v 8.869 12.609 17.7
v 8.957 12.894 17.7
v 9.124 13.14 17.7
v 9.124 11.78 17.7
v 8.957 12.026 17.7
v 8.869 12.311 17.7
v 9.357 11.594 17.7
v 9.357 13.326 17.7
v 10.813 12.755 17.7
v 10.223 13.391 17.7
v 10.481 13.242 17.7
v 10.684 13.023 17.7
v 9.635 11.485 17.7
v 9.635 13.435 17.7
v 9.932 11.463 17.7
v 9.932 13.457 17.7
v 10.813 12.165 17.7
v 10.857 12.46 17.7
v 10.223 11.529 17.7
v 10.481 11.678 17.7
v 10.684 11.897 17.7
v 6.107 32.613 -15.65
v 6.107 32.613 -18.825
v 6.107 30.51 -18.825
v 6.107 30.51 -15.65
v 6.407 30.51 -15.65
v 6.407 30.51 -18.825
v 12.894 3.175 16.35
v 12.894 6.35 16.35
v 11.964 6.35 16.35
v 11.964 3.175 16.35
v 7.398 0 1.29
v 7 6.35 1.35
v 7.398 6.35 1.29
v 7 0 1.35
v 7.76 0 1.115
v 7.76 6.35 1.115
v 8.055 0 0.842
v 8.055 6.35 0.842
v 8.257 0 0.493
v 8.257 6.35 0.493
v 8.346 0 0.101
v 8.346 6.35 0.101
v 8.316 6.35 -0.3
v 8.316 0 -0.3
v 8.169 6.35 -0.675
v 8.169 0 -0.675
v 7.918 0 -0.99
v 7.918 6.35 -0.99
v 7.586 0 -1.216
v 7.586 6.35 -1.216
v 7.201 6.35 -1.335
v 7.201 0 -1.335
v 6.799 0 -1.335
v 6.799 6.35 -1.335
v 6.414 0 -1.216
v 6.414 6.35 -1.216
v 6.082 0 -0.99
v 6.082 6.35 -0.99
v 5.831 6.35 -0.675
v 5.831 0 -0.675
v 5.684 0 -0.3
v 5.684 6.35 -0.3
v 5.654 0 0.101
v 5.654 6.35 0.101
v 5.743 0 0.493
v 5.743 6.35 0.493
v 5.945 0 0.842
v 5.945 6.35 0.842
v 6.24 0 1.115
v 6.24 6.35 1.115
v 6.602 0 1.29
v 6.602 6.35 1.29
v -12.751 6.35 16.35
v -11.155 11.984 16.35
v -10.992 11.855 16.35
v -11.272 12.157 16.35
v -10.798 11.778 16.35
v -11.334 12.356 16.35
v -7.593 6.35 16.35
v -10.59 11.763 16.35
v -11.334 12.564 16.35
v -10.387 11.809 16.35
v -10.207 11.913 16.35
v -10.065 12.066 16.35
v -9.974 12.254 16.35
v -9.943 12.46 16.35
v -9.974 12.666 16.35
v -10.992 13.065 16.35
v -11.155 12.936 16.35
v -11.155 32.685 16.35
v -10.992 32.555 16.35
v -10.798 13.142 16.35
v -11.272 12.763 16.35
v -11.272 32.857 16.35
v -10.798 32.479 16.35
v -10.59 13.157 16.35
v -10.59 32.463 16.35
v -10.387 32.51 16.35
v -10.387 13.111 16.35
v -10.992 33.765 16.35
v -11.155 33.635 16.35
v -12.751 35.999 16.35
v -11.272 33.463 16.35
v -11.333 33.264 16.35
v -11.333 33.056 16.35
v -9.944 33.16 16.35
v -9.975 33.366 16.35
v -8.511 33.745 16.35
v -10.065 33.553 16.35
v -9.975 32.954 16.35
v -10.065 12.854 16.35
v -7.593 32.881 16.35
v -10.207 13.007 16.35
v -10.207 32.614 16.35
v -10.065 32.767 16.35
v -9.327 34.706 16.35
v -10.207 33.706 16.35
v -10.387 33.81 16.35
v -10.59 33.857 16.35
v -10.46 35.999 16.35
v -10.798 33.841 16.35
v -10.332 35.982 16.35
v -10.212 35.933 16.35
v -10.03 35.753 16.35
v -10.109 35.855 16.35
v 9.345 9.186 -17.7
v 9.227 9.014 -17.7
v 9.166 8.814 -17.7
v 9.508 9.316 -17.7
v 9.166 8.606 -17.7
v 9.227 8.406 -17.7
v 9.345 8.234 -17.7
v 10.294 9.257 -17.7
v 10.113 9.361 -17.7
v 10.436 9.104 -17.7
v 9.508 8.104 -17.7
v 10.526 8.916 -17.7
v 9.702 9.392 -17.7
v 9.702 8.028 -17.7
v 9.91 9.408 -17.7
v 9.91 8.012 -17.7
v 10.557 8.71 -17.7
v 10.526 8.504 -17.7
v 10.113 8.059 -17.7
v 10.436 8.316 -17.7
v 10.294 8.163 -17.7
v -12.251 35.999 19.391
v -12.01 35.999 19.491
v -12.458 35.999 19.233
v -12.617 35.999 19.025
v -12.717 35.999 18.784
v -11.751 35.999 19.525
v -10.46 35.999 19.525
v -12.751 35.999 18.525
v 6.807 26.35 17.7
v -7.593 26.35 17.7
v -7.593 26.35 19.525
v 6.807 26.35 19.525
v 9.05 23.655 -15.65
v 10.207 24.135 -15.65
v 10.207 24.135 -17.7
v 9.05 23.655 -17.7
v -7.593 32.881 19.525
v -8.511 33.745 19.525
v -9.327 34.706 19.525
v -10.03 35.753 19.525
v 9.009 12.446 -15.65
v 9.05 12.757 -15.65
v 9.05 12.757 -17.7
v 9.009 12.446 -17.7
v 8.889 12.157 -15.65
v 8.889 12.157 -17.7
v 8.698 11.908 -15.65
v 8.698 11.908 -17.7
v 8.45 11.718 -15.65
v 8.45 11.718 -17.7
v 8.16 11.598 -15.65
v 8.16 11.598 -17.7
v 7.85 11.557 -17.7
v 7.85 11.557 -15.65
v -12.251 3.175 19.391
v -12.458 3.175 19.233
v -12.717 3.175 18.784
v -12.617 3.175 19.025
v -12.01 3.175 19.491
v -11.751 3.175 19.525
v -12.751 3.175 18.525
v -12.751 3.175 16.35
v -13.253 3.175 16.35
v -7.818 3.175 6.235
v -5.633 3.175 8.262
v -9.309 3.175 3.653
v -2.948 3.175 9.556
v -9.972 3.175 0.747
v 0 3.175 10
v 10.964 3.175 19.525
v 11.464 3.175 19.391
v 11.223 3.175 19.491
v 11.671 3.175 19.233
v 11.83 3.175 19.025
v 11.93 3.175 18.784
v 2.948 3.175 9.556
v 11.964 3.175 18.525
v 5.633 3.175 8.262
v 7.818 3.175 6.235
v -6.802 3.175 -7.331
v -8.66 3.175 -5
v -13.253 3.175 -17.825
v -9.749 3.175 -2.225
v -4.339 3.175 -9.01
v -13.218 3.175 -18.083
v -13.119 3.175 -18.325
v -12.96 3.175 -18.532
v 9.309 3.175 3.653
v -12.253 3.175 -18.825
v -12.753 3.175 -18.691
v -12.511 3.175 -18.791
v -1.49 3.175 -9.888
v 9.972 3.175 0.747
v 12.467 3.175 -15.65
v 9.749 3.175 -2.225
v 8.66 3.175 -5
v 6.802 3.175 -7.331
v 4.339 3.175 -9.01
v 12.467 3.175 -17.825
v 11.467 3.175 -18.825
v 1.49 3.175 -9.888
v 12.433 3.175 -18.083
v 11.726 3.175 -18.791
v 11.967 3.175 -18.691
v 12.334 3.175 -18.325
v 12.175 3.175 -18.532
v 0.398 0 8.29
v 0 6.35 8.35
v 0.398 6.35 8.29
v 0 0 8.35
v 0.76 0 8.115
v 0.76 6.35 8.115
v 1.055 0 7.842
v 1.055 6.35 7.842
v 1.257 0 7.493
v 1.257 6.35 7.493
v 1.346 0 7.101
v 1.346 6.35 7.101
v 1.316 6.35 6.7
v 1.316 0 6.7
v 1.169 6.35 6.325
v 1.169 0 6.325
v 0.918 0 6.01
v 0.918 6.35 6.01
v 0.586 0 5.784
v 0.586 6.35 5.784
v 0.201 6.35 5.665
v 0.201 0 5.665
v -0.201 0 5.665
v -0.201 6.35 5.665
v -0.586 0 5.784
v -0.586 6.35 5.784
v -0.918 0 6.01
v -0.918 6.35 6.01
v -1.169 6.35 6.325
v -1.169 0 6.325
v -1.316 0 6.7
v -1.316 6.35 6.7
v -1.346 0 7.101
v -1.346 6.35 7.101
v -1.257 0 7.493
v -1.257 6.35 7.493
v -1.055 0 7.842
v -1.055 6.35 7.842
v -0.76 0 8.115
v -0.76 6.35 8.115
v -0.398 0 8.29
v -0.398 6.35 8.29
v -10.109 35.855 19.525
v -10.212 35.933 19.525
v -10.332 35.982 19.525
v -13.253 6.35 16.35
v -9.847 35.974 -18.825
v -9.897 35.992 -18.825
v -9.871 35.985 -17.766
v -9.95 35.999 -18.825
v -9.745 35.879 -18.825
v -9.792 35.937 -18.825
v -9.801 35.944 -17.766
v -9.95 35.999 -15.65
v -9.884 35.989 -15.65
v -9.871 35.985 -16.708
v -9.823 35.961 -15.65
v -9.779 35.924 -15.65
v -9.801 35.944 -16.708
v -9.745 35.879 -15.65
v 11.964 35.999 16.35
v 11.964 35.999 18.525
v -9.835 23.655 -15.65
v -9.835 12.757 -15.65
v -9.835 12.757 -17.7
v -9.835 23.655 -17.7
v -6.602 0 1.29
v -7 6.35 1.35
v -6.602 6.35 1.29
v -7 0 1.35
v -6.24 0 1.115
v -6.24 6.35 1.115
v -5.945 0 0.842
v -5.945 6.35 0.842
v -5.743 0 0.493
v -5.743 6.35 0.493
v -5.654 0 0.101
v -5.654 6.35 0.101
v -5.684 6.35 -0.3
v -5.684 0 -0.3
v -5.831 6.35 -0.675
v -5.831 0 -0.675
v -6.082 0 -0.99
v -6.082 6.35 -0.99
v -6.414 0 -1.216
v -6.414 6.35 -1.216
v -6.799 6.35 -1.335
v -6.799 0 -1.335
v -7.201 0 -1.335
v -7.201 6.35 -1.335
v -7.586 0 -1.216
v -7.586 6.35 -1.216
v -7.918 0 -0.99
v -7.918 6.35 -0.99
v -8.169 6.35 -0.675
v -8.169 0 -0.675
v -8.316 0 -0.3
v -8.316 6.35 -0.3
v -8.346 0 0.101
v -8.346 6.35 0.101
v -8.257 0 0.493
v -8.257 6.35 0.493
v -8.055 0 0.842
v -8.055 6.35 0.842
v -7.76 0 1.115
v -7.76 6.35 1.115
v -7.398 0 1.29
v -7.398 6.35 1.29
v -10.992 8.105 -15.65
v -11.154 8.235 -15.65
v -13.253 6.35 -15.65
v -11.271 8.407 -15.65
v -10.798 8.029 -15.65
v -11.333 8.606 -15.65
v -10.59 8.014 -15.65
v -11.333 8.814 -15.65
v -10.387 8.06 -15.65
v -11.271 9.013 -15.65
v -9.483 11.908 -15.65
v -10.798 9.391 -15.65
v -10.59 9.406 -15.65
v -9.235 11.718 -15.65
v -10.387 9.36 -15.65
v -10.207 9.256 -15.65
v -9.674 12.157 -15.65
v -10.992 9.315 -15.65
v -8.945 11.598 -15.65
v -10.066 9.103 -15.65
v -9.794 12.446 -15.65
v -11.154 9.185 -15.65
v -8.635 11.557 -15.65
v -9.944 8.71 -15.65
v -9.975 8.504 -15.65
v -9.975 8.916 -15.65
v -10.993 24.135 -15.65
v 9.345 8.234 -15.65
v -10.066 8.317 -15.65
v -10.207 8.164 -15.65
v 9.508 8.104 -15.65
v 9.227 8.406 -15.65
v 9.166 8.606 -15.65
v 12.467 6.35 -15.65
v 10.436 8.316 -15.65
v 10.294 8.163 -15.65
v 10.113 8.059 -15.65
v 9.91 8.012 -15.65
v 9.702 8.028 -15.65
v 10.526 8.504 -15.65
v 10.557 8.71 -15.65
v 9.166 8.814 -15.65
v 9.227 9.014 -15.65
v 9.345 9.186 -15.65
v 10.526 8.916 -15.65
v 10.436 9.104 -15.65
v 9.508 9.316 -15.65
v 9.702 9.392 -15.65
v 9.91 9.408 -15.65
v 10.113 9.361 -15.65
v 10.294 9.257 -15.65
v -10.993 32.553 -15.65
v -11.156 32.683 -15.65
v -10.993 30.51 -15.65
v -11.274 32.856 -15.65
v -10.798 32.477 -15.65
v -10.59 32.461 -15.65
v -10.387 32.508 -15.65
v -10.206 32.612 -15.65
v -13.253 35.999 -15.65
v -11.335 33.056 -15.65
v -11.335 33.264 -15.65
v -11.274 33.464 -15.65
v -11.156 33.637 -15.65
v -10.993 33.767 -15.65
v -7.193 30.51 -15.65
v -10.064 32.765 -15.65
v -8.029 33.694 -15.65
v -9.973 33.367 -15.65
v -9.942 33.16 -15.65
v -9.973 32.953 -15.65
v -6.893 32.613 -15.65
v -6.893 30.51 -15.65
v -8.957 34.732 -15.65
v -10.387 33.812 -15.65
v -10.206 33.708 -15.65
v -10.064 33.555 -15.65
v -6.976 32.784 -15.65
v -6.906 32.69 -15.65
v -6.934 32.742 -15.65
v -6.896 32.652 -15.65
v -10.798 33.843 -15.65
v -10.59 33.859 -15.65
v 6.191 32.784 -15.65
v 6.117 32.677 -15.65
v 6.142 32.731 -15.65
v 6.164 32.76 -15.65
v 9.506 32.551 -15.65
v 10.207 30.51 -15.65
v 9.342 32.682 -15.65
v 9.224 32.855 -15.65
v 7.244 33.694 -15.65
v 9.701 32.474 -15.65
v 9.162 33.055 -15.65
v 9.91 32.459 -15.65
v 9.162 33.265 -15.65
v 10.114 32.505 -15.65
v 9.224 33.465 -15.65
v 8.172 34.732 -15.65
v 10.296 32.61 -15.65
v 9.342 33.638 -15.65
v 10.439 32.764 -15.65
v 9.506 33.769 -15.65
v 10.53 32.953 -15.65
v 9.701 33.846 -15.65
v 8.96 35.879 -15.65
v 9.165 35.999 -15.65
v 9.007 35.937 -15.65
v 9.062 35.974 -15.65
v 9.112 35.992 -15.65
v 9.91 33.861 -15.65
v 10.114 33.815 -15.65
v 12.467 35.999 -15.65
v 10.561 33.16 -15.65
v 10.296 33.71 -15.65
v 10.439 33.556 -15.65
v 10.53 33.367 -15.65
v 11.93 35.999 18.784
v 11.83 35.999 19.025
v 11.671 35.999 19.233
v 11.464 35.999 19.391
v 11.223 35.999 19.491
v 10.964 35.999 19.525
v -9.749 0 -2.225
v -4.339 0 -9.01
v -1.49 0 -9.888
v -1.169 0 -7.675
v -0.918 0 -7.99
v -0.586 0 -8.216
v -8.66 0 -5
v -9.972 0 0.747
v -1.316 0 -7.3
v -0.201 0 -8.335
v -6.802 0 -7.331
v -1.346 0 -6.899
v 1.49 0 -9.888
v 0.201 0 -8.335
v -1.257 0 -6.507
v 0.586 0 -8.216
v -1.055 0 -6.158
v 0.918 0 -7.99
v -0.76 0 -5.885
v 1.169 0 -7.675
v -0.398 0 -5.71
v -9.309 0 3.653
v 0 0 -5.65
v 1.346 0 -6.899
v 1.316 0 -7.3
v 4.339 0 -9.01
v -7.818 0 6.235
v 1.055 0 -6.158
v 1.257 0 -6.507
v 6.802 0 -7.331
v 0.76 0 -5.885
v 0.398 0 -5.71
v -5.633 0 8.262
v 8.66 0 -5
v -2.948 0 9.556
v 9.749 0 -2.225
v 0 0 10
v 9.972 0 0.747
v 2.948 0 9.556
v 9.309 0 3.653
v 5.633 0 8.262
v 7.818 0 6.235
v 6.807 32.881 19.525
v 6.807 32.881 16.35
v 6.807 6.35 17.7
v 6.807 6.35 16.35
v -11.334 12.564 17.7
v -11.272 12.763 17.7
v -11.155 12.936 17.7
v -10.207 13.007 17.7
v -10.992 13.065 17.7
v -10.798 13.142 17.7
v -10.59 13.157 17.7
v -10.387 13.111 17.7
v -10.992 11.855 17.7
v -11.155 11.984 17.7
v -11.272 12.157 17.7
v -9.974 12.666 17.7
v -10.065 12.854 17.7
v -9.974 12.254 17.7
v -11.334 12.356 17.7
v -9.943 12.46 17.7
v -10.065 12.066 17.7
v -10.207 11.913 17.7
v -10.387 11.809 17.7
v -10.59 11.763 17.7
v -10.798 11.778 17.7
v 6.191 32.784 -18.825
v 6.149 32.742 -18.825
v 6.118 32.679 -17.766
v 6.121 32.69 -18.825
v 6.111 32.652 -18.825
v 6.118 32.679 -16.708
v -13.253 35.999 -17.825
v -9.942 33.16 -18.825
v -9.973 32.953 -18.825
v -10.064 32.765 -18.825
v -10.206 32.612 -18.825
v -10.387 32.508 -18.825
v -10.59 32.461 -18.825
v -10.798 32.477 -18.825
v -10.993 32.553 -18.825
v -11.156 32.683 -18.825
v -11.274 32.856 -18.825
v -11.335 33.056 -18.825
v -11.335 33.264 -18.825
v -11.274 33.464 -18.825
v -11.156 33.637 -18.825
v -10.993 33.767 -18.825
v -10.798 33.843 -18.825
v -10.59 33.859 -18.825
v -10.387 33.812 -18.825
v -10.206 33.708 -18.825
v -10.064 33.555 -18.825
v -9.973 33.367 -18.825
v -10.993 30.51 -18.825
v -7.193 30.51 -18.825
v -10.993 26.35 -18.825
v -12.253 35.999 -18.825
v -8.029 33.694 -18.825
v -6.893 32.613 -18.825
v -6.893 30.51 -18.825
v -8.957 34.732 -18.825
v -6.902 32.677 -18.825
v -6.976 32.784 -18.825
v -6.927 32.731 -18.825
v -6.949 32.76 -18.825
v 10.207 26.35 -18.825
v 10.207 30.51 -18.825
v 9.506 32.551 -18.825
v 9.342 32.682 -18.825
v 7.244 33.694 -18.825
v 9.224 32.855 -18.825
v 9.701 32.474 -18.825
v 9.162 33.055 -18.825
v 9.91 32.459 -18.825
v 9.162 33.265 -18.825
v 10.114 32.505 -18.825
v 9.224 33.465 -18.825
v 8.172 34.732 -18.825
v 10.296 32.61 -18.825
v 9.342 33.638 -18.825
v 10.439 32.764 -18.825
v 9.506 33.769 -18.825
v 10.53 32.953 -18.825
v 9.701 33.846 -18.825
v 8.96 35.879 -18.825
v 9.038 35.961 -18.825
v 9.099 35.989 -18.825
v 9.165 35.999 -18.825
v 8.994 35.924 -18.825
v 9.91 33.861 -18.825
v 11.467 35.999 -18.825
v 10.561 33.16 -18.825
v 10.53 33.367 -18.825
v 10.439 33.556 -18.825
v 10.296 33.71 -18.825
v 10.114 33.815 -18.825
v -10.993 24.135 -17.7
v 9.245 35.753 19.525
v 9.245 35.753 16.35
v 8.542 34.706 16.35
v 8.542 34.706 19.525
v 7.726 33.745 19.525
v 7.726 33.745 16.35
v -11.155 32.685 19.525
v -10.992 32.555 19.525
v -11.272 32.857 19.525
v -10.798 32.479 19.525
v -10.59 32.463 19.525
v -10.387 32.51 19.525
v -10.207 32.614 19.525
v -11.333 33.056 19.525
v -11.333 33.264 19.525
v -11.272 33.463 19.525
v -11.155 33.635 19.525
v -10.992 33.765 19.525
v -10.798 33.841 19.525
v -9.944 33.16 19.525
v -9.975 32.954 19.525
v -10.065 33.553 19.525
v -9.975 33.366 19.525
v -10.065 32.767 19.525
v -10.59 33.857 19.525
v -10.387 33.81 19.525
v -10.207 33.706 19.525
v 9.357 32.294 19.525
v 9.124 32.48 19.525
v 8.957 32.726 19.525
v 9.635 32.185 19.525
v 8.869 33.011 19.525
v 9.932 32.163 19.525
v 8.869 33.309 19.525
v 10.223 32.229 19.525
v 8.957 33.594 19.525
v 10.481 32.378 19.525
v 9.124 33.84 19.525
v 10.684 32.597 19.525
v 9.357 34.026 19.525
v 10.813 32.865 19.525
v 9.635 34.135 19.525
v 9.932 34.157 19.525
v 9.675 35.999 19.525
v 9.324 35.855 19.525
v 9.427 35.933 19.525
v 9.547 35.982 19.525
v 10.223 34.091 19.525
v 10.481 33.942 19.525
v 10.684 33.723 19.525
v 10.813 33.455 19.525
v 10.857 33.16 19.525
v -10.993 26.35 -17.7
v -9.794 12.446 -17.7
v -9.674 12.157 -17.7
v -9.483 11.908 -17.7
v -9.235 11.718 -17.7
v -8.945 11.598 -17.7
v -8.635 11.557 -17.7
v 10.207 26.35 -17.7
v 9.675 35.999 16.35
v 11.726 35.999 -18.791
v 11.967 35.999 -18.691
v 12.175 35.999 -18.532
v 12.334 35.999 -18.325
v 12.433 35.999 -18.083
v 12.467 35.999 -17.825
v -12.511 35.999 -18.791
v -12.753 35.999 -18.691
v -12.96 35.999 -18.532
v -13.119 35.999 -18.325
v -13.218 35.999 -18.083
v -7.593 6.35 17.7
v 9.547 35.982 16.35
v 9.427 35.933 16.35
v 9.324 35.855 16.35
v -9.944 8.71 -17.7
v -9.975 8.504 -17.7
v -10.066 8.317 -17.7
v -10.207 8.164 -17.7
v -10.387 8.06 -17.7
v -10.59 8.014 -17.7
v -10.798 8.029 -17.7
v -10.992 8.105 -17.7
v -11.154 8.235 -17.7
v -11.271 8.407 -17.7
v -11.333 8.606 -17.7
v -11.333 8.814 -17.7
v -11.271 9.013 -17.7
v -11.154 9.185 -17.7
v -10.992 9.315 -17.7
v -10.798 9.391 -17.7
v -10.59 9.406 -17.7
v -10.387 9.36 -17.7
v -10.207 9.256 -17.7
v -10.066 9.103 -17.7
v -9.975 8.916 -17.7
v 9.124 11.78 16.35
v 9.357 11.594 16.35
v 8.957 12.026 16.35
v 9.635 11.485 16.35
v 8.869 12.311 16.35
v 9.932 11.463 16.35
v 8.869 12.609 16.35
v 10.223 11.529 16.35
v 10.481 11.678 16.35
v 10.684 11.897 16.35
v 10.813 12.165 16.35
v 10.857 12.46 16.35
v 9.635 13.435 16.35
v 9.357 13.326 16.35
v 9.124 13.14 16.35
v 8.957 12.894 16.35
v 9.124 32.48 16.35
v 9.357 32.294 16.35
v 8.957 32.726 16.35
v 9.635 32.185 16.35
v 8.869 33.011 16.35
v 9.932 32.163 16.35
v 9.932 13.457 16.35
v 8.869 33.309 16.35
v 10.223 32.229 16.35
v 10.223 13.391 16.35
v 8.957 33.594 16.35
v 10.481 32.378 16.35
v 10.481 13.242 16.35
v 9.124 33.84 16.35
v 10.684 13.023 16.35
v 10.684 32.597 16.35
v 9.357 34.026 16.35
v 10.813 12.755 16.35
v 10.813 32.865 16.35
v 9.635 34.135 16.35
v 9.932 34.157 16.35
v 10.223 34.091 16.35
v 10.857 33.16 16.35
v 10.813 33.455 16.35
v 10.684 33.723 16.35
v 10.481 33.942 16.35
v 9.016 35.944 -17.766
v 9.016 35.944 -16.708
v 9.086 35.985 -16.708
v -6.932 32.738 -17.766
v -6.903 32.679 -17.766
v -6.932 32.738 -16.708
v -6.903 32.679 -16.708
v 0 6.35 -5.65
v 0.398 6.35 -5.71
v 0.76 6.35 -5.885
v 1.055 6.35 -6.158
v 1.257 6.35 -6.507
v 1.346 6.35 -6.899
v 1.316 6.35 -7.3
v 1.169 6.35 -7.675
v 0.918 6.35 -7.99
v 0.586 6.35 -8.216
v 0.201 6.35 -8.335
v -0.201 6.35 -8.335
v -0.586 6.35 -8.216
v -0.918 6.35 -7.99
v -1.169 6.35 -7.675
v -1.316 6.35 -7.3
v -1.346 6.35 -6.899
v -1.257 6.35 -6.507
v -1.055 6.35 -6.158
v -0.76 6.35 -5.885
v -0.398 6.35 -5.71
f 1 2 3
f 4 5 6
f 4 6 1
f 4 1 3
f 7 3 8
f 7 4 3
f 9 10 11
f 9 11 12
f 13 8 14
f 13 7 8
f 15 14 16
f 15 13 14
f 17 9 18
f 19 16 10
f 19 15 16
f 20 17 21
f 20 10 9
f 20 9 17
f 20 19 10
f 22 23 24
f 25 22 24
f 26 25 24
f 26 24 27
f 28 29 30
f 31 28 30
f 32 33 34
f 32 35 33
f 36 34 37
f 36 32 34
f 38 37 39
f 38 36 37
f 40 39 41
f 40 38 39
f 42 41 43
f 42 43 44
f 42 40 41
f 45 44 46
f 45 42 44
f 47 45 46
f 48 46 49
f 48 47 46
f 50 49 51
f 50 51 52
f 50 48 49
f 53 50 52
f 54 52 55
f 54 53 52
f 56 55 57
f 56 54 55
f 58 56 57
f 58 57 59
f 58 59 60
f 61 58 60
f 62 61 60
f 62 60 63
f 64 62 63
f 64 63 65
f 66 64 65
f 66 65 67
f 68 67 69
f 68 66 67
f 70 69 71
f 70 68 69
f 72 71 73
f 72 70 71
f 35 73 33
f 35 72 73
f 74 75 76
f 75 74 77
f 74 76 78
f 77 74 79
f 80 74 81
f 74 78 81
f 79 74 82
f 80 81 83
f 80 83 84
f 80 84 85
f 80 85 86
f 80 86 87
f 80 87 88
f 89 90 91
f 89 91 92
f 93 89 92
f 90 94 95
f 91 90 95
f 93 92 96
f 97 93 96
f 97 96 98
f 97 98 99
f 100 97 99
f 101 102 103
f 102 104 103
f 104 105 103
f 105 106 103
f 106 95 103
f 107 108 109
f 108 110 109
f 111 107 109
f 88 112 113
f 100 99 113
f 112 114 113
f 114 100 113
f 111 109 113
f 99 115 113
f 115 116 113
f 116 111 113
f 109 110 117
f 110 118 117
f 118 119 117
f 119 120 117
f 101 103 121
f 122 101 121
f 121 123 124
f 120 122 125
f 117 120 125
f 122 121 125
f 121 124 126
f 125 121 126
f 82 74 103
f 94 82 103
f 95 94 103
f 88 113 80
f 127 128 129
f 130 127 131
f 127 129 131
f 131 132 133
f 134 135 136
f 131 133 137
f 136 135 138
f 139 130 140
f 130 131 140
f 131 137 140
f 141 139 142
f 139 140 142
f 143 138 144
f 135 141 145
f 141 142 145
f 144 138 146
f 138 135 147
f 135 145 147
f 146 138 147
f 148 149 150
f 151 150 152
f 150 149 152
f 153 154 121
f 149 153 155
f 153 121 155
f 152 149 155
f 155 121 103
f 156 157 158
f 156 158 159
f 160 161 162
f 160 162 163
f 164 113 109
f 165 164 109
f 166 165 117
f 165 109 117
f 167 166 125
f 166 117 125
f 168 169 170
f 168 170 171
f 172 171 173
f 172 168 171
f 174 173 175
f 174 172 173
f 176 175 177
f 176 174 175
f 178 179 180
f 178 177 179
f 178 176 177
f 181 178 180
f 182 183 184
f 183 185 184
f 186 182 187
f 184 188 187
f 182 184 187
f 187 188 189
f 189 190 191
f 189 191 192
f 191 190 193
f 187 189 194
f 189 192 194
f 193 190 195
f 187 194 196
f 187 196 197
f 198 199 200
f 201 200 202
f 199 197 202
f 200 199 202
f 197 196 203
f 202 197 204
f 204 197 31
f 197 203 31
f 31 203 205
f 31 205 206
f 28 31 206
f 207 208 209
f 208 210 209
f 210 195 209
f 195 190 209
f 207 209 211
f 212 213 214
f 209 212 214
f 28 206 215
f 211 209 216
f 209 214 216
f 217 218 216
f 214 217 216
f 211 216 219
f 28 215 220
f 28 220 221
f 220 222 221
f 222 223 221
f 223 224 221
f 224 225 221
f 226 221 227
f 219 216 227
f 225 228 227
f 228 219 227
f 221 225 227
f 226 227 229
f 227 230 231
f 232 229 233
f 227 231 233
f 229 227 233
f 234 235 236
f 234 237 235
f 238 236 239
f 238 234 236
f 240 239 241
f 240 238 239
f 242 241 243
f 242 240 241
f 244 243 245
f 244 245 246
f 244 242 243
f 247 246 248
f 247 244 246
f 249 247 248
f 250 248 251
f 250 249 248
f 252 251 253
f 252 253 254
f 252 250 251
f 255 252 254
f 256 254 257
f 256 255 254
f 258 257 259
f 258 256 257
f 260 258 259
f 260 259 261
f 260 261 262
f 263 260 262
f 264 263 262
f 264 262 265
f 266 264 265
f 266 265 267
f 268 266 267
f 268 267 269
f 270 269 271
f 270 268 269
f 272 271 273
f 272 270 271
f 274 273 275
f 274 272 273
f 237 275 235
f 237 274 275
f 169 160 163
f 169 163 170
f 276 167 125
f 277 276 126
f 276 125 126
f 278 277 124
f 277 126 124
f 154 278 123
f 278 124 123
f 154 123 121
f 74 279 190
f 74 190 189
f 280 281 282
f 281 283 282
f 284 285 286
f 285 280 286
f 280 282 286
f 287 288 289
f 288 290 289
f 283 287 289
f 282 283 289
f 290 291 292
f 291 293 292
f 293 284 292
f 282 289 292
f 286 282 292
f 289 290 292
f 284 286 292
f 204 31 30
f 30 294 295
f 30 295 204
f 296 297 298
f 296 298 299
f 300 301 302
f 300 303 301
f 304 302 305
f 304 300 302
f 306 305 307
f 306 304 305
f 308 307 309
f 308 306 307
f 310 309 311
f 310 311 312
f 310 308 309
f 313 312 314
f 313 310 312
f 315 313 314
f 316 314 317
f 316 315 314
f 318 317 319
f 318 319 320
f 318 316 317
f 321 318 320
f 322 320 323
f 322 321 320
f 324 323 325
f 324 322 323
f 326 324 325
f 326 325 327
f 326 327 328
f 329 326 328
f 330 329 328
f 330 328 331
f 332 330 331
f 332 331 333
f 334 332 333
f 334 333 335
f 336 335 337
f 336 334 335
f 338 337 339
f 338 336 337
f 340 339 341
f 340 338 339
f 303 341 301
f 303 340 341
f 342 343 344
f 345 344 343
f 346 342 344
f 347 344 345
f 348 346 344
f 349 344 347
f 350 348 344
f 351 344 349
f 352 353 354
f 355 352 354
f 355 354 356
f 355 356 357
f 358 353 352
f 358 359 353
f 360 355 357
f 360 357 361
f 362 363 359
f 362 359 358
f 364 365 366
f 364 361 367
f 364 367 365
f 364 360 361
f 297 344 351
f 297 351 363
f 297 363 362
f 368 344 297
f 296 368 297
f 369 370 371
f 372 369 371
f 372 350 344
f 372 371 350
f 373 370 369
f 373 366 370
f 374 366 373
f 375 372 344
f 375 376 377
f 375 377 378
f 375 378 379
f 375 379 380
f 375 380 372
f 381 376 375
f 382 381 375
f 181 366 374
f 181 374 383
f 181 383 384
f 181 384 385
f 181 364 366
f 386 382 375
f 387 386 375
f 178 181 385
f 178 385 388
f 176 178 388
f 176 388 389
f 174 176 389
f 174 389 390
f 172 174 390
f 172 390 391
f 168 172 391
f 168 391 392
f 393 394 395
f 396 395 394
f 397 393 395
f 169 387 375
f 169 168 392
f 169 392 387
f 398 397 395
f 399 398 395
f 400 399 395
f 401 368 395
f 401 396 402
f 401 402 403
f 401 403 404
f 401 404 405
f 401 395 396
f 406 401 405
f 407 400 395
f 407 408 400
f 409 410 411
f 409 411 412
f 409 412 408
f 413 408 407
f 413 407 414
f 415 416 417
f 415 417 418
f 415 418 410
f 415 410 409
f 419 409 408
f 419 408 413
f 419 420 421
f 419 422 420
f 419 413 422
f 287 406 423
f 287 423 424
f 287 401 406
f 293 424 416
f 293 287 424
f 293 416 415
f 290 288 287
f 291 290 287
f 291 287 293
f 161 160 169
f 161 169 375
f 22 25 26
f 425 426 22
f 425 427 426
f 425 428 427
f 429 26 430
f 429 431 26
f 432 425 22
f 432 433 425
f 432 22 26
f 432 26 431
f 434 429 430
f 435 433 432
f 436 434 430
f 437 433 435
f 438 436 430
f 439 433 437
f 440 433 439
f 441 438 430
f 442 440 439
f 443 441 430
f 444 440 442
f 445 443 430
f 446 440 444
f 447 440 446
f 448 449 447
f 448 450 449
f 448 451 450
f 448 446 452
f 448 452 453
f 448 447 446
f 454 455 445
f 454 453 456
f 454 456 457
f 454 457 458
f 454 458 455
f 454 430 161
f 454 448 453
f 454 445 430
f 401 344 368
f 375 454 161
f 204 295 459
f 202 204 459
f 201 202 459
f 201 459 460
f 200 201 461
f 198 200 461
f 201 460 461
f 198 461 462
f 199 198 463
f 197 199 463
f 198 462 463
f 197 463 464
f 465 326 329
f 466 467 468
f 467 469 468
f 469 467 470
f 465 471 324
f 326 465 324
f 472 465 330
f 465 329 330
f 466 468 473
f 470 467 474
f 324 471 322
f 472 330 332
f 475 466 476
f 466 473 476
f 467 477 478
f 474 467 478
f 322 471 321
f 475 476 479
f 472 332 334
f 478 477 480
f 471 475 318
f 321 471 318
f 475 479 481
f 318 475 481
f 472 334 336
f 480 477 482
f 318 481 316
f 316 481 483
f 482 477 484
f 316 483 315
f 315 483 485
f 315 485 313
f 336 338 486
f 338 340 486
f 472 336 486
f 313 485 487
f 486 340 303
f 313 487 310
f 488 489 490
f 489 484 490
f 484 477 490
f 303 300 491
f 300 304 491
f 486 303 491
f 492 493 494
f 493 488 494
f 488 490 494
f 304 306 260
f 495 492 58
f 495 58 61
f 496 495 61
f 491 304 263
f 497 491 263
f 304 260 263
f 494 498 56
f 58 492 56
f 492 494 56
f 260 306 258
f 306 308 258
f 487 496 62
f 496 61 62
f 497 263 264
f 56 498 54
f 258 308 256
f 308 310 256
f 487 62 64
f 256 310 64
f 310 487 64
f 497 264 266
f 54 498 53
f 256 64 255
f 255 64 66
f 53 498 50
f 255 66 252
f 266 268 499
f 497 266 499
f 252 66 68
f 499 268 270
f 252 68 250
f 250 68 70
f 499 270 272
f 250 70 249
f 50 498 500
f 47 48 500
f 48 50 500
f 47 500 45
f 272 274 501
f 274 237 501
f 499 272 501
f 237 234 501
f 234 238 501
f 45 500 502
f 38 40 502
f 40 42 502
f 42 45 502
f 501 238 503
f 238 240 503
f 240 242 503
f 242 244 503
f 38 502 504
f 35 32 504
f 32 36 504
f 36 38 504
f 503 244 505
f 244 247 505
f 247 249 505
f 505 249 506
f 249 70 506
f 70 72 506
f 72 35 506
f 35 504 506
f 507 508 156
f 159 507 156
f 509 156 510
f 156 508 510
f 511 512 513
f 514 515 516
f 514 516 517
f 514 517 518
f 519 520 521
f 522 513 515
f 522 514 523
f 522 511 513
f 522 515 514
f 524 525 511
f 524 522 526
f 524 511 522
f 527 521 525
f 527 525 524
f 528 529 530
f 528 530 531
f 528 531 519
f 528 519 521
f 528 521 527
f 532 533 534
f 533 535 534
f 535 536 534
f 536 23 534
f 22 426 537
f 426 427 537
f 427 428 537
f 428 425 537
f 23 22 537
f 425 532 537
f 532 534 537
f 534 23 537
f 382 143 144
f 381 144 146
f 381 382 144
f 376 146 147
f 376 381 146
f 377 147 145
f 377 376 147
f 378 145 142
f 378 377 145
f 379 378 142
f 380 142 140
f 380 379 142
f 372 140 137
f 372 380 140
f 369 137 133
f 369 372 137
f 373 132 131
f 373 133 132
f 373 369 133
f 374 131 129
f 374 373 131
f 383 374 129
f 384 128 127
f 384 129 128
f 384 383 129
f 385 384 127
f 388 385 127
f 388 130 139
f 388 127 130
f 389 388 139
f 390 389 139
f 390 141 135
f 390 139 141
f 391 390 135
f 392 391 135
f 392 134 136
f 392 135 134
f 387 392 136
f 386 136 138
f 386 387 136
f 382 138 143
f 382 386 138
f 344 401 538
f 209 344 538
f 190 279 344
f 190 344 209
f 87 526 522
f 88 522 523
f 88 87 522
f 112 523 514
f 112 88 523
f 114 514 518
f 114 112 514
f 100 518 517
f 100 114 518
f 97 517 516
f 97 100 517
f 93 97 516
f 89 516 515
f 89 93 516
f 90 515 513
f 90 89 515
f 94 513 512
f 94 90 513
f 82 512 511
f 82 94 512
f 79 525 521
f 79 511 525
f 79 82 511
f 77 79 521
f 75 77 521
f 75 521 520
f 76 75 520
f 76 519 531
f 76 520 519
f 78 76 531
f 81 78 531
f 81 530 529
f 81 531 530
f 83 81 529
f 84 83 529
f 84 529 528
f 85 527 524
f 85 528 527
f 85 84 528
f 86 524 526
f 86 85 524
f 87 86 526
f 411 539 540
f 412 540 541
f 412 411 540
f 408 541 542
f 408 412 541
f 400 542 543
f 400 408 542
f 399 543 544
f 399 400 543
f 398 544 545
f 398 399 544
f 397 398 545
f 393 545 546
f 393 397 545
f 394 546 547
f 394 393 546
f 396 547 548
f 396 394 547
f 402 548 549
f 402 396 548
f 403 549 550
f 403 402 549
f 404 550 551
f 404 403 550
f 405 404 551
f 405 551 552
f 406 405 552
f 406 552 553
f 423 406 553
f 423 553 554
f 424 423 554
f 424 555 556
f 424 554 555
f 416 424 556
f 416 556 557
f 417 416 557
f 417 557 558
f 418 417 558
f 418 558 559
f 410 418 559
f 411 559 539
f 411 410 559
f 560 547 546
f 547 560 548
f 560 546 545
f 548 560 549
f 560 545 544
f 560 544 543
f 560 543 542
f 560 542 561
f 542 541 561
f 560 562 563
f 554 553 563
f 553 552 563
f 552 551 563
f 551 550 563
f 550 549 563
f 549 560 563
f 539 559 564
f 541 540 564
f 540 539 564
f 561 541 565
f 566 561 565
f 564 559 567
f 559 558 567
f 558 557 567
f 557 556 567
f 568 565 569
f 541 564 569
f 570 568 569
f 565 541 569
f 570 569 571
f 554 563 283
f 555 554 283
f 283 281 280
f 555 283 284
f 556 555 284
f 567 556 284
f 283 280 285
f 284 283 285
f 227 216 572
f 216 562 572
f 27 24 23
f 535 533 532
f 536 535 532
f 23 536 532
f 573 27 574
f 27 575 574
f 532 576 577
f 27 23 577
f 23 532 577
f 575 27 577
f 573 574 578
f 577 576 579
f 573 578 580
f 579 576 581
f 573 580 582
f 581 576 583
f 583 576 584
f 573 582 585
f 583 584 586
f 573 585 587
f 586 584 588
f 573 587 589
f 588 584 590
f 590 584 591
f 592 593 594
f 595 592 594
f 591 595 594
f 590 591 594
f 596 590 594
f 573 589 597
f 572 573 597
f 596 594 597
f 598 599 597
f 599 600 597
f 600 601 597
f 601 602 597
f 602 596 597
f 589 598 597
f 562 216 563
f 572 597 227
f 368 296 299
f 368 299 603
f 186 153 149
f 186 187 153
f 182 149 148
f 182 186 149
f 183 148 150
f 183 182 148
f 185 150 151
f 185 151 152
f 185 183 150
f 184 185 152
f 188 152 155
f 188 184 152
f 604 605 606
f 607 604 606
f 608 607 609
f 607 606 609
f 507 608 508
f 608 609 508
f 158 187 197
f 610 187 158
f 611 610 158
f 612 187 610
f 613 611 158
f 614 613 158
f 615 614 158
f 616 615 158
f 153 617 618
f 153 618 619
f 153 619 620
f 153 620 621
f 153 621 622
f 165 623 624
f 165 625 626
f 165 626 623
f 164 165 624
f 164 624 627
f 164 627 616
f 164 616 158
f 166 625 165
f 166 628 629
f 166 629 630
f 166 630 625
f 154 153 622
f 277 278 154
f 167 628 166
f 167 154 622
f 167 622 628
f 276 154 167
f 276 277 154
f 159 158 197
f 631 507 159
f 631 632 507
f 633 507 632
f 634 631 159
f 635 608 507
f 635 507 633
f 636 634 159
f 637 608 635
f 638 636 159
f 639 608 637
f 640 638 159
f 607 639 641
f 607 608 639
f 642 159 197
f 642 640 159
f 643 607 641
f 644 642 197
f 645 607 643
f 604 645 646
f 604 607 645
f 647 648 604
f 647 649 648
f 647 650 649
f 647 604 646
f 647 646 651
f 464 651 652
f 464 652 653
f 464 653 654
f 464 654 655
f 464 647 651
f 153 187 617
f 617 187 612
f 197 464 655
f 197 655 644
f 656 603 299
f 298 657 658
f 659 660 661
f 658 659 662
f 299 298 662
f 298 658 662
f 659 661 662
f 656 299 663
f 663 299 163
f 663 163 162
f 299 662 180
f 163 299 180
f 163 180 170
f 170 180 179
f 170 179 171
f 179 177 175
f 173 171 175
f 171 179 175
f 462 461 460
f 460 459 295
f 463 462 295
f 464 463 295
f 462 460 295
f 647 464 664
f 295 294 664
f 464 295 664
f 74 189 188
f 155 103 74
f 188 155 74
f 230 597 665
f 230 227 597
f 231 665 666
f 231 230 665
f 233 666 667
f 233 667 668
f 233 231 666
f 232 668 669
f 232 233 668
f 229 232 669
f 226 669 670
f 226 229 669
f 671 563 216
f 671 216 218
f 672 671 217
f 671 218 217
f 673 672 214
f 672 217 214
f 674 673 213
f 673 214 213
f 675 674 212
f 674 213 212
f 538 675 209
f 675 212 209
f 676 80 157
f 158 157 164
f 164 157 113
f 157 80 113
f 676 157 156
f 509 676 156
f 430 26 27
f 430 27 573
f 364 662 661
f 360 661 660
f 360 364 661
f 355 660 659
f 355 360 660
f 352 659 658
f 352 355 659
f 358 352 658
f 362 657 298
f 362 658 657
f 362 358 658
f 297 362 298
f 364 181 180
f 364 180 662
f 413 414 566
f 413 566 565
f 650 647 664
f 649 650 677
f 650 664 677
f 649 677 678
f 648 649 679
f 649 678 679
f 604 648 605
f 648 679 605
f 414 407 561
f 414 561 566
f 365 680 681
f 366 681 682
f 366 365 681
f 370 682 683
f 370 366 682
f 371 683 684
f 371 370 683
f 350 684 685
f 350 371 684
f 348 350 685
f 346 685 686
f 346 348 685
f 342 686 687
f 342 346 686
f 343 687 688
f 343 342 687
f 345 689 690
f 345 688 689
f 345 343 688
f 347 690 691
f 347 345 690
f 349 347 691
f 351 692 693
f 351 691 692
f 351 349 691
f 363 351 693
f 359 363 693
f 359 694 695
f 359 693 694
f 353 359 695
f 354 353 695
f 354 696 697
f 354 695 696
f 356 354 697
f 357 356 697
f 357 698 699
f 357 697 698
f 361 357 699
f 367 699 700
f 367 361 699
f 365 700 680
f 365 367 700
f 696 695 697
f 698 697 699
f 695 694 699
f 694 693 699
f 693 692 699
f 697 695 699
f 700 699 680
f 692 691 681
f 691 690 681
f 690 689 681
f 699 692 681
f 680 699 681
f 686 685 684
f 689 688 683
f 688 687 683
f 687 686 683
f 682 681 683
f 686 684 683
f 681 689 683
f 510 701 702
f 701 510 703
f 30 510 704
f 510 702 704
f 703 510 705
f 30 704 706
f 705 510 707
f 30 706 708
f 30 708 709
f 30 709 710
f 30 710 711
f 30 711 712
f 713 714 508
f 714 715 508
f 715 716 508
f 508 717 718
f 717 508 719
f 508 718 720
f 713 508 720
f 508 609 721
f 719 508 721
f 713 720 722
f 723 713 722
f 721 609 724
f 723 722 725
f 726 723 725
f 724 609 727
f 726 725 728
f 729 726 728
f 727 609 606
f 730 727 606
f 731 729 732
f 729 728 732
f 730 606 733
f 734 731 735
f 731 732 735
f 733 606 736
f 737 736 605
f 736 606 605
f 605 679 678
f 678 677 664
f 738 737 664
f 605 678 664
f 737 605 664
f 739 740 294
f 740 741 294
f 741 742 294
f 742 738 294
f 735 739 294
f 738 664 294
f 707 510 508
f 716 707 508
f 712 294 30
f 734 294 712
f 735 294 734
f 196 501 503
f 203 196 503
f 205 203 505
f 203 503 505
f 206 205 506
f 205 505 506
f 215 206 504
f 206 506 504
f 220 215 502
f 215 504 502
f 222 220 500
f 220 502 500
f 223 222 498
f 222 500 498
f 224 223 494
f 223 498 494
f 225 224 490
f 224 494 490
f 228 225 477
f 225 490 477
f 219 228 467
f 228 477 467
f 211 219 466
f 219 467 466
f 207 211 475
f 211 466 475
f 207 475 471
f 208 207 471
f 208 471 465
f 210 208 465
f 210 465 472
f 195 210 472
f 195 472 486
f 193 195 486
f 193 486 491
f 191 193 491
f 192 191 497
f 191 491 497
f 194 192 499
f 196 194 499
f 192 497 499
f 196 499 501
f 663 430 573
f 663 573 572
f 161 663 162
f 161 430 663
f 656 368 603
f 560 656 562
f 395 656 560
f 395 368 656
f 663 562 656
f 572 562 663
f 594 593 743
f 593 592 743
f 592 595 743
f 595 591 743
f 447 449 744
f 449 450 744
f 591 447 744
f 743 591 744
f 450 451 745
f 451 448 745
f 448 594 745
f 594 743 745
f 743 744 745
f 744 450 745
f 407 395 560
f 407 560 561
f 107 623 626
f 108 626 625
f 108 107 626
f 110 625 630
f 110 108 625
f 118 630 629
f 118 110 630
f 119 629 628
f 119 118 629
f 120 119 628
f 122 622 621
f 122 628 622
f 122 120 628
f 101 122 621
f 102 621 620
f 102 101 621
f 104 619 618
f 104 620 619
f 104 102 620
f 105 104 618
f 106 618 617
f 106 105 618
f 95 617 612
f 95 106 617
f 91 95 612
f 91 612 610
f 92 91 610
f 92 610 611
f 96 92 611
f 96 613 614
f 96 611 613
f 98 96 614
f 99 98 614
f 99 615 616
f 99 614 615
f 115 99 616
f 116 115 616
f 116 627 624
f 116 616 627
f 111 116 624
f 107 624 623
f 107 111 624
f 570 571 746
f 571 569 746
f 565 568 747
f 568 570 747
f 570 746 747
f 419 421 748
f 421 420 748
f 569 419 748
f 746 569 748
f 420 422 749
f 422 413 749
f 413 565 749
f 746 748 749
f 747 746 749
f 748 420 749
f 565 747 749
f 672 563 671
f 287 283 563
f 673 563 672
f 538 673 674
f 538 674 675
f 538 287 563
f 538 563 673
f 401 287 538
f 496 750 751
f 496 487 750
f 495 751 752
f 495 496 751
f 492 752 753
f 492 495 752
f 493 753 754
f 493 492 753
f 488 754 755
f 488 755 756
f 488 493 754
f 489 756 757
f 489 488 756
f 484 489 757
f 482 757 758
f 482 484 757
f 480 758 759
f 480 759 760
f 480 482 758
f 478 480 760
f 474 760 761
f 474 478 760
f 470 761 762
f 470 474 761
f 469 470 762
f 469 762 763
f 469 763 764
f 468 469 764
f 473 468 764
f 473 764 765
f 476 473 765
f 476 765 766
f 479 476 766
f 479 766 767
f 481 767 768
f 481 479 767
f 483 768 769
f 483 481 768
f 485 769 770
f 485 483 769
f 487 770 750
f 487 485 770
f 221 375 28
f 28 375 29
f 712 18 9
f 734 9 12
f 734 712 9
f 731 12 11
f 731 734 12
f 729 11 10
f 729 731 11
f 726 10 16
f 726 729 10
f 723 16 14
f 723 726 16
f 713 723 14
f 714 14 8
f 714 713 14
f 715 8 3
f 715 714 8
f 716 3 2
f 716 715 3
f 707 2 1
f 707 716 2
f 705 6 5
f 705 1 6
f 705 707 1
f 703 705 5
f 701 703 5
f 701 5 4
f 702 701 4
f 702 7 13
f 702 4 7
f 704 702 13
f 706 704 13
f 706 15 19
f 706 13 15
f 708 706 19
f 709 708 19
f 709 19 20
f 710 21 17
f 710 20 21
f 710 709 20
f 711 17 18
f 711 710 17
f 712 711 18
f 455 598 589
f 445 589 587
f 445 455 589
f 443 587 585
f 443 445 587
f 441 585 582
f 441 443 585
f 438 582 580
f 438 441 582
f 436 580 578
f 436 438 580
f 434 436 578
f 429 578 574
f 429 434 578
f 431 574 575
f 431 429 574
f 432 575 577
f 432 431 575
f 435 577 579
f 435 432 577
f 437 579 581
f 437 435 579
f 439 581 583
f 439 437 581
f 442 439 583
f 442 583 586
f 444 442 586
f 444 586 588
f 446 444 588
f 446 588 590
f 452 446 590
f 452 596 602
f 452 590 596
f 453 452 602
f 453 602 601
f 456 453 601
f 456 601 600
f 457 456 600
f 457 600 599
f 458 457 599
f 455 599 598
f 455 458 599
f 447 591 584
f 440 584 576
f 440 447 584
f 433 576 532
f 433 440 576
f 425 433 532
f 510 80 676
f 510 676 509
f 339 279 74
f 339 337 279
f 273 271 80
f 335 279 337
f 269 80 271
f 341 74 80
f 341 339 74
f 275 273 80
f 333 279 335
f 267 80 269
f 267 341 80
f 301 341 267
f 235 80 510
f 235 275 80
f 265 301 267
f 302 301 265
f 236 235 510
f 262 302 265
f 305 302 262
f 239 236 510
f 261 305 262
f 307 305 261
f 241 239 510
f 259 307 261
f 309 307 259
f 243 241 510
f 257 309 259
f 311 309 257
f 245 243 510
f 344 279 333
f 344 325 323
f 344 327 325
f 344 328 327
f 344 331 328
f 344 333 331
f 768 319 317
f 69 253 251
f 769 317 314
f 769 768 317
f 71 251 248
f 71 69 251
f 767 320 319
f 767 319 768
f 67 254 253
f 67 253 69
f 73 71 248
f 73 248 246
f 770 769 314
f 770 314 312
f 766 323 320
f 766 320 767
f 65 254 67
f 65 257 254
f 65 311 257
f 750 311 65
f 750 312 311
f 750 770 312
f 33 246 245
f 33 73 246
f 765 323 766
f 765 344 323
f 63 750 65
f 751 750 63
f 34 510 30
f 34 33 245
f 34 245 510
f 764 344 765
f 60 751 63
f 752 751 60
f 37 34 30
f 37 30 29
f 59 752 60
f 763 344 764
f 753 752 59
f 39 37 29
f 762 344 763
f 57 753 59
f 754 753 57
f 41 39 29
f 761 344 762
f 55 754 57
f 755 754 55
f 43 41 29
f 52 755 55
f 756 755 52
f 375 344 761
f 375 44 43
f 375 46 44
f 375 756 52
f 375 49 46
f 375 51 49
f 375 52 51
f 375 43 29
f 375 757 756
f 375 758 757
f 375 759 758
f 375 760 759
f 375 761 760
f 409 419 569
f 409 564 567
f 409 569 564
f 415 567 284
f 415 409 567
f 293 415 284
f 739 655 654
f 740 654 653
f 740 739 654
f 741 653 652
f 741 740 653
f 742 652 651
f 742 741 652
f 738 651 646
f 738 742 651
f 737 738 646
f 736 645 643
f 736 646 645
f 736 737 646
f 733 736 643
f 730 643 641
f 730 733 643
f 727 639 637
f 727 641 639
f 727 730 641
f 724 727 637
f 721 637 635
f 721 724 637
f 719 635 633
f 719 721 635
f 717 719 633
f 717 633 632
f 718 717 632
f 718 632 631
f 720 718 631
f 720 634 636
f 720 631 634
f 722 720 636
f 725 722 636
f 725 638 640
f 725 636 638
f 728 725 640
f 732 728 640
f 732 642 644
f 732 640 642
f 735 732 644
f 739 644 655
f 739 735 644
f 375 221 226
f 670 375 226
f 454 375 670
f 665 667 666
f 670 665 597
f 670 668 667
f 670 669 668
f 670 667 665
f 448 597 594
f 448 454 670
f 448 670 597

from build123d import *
from OCP.BRepAlgoAPI import BRepAlgoAPI_Cut
from OCP.TopTools import TopTools_ListOfShape

# Parameters (mm, degrees)
SKETCH1_R                 = 10
SKETCH1_R_2               = 1.35
BOSS_EXTRUDE1_DEPTH       = 3.175
SKETCH2_W                 = 38.058543228
SKETCH2_H                 = 41.75
SKETCH2_R                 = 1.35
BOSS_EXTRUDE2_DEPTH       = 3.175
SKETCH3_W                 = 38.058543228
SKETCH3_H                 = 41.75
SKETCH3_W_2               = 31.708543228
SKETCH3_H_2               = 35.4
BOSS_EXTRUDE3_DEPTH       = 20
FILLET1_R                 = 5
BOSS_EXTRUDE4_OUTLINE_R   = 1
BOSS_EXTRUDE4_OUTLINE_R_2 = 0.698520241
BOSS_EXTRUDE4_OUTLINE_R_3 = 0.699131638
BOSS_EXTRUDE4_DEPTH       = 4.524579022
SKETCH6_R                 = 0.699665004
SKETCH6_R_2               = 0.703272365
SKETCH6_R_3               = 0.700673295
SKETCH6_R_4               = 0.698053945
BOSS_EXTRUDE5_DEPTH       = 5.225420978
CUT_EXTRUDE3_DEPTH        = 39.629021569
CUT_EXTRUDE4_DEPTH        = 44.672508997
FILLET2_R                 = 1


with BuildPart() as part:
    # Sketch1 → Boss-Extrude1 (new body)
    with BuildSketch(Plane(origin=(0, 0, 0), x_dir=(1, 0, 0), z_dir=(0, 1, 0))):
        with Locations(Location((0, 0, 0), (0, 0, 270))):
            Circle(SKETCH1_R)
        with Locations(Location((0, 7, 0), (0, 0, 270))):
            Circle(SKETCH1_R_2, mode=Mode.SUBTRACT)
        with Locations(Location((7, 0, 0), (0, 0, 270))):
            Circle(SKETCH1_R_2, mode=Mode.SUBTRACT)
        with Locations(Location((0, -7, 0), (0, 0, 270))):
            Circle(SKETCH1_R_2, mode=Mode.SUBTRACT)
        with Locations(Location((-7, 0, 0), (0, 0, 270))):
            Circle(SKETCH1_R_2, mode=Mode.SUBTRACT)
    extrude(amount=BOSS_EXTRUDE1_DEPTH)

    # Sketch2 → Boss-Extrude2 (add)
    with BuildSketch(Plane(origin=(0, 3.175, 0), x_dir=(1, 0, 0), z_dir=(0, 1, 0))):
        Rectangle(SKETCH2_W, SKETCH2_H)
        with Locations(Location((0, -7, 0), (0, 0, 270))):
            Circle(SKETCH2_R, mode=Mode.SUBTRACT)
        with Locations(Location((7, 0, 0), (0, 0, 270))):
            Circle(SKETCH2_R, mode=Mode.SUBTRACT)
        with Locations(Location((-7, 0, 0), (0, 0, 270))):
            Circle(SKETCH2_R, mode=Mode.SUBTRACT)
        with Locations(Location((0, 7, 0), (0, 0, 270))):
            Circle(SKETCH2_R, mode=Mode.SUBTRACT)
    extrude(amount=BOSS_EXTRUDE2_DEPTH)

    # Sketch3 → Boss-Extrude3 (add)
    with BuildSketch(Plane(origin=(0, 6.35, 0), x_dir=(1, 0, 0), z_dir=(0, 1, 0))):
        Rectangle(SKETCH3_W, SKETCH3_H)
        Rectangle(SKETCH3_W_2, SKETCH3_H_2, mode=Mode.SUBTRACT)
    extrude(amount=BOSS_EXTRUDE3_DEPTH)

    # Fillet1
    fillet1_edges = [part.edges().sort_by_distance(p)[0] for p in [
        (-19.029271614, 14.7625, -20.875),
        (-19.029271614, 14.7625, 20.875),
        (19.029271614, 14.7625, 20.875),
        (19.029271614, 14.7625, -20.875),
    ]]
    fillet(fillet1_edges, radius=FILLET1_R)

    # Boss-Extrude4: read off the stored shape, not the designer's step
    # Boss-Extrude4 outline → Boss-Extrude4 (add)
    # profile 1 of 2: a face of its own
    with BuildSketch(Plane.XY.offset(16.350420978)):
        with BuildLine():
            ThreePointArc((9.674791631, 35.998523082), (9.427181956, 35.932908065), (9.244559074, 35.753284112))
            ThreePointArc((9.244559074, 35.753284112), (8.147643376, 34.213929311), (6.807481387, 32.880961337))
            Line((6.807481387, 32.880961337), (6.807482447, 6.35))
            Line((6.807482447, 6.35), (11.963760646, 6.35))
            Line((11.963760646, 6.35), (11.963760646, 35.998520144))
            Line((11.963760646, 35.998520144), (9.674791631, 35.998523082))
        make_face()
        with Locations((9.857482447, 33.16)):
            Circle(BOSS_EXTRUDE4_OUTLINE_R, mode=Mode.SUBTRACT)
        with Locations((9.857482447, 12.46)):
            Circle(BOSS_EXTRUDE4_OUTLINE_R, mode=Mode.SUBTRACT)
    # profile 2 of 2: a face of its own
    with BuildSketch(Plane.XY.offset(16.350420978)):
        with BuildLine():
            Line((-12.751066043, 35.998520144), (-12.751066043, 6.35))
            Line((-12.751066043, 6.35), (-7.592517553, 6.35))
            Line((-7.592517553, 6.35), (-7.592516964, 32.880958857))
            ThreePointArc((-7.592516964, 32.880958857), (-8.932679762, 34.213927416), (-10.029597495, 35.753282149))
            ThreePointArc((-10.029597495, 35.753282149), (-10.212218516, 35.932905514), (-10.459826737, 35.998520144))
            Line((-10.459826737, 35.998520144), (-12.751066043, 35.998520144))
        make_face()
        with Locations((-10.642517553, 33.16)):
            Circle(BOSS_EXTRUDE4_OUTLINE_R_2, mode=Mode.SUBTRACT)
        with Locations((-10.642517553, 12.46)):
            Circle(BOSS_EXTRUDE4_OUTLINE_R_3, mode=Mode.SUBTRACT)
    extrude(amount=BOSS_EXTRUDE4_DEPTH)

    # Sketch6 → Boss-Extrude5 (add)
    with BuildSketch(Plane(origin=(0, 0, -15.649579022), x_dir=(-1, 0, 0), z_dir=(0, 0, -1))):
        with BuildLine():
            Line((10.992517553, 24.135), (10.992517553, 30.51))
            Line((10.992517553, 30.51), (7.192517366, 30.510000072))
            Line((7.192517366, 30.510000072), (6.892517553, 30.510000072))
            Line((6.892517553, 30.510000072), (6.892517553, 32.612557612))
            add(Edge.make_bspline(
                [(6.975743415, 32.783855976), (6.958921233, 32.771091761), (6.928542383, 32.73934935), (6.899316538, 32.679660552), (6.892517469, 32.634957243), (6.892517553, 32.612557612)],
                knots=[1.062e-06, 1.062e-06, 1.062e-06, 1.062e-06, 0.322323684, 0.658094096, 1, 1, 1, 1], degree=3, weights=[1, 1, 1, 1, 1, 1]))
            ThreePointArc((6.975743415, 32.783855976), (8.509170356, 34.198162413), (9.744817778, 35.878887355))
            add(Edge.make_bspline(
                [(9.950114528, 35.998516481), (9.923391157, 35.998516414), (9.869066225, 35.989019468), (9.796326784, 35.947026629), (9.759487209, 35.903468994), (9.744817778, 35.878887355)],
                knots=[0, 0, 0, 0, 0.324047023, 0.652881456, 1, 1, 1, 1], degree=3, weights=[1, 1, 1, 1, 1, 1]))
            Line((9.950114528, 35.998516481), (11.752517552, 35.998516481))
            Line((11.752517552, 35.998516481), (13.252517552, 35.998516481))
            Line((13.252517552, 35.998516481), (13.252517552, 6.318190736))
            Line((13.252517552, 6.318190736), (-12.46748245, 6.318190736))
            Line((-12.46748245, 6.318190736), (-12.46748245, 35.998516481))
            Line((-12.46748245, 35.998516481), (-10.96748245, 35.998516481))
            Line((-10.96748245, 35.998516481), (-9.165078771, 35.998516481))
            add(Edge.make_bspline(
                [(-8.959782959, 35.878887832), (-8.974454973, 35.903473814), (-9.011299786, 35.947034481), (-9.084041461, 35.989022268), (-9.138360889, 35.998516579), (-9.165078771, 35.998516481)],
                knots=[3.25e-07, 3.25e-07, 3.25e-07, 3.25e-07, 0.347182134, 0.676017862, 1, 1, 1, 1], degree=3, weights=[1, 1, 1, 1, 1, 1]))
            ThreePointArc((-8.959782959, 35.878887832), (-7.72413548, 34.198162669), (-6.190708414, 32.783856055))
            add(Edge.make_bspline(
                [(-6.107482447, 32.612555023), (-6.107481996, 32.634920643), (-6.114271613, 32.679614721), (-6.143476784, 32.739319032), (-6.173880837, 32.77108775), (-6.190708414, 32.783856055)],
                knots=[0, 0, 0, 0, 0.341381322, 0.677579946, 1, 1, 1, 1], degree=3, weights=[1, 1, 1, 1, 1, 1]))
            Line((-6.107482447, 32.612555023), (-6.107482447, 30.510000072))
            Line((-6.107482447, 30.510000072), (-6.407482262, 30.510000072))
            Line((-6.407482262, 30.510000072), (-10.207482447, 30.51))
            Line((-10.207482447, 30.51), (-10.207482447, 24.135))
            Line((-10.207482447, 24.135), (-9.049769141, 23.654765682))
            Line((-9.049769141, 23.654765682), (-9.049769141, 12.756914674))
            ThreePointArc((-9.049769141, 12.756914674), (-8.698297278, 11.908386539), (-7.849769141, 11.556914678))
            Line((-7.849769141, 11.556914678), (8.634804248, 11.556914678))
            ThreePointArc((8.634804248, 11.556914678), (9.483332385, 11.908386541), (9.834804247, 12.756914678))
            Line((9.834804247, 12.756914678), (9.834804247, 23.654765682))
            Line((9.834804247, 23.654765682), (10.992517553, 24.135))
        make_face()
        with Locations(Location((-9.857482447, 8.71, 0), (0, 0, 180))):
            Circle(SKETCH6_R, mode=Mode.SUBTRACT)
        with Locations(Location((-9.857482447, 33.16, 0), (0, 0, 180))):
            Circle(SKETCH6_R_2, mode=Mode.SUBTRACT)
        with Locations(Location((10.642517553, 33.16, 0), (0, 0, 180))):
            Circle(SKETCH6_R_3, mode=Mode.SUBTRACT)
        with Locations(Location((10.642517553, 8.71, 0), (0, 0, 180))):
            Circle(SKETCH6_R_4, mode=Mode.SUBTRACT)
    extrude(amount=BOSS_EXTRUDE5_DEPTH)

    # Sketch7 → Cut-Extrude3 (cut, through all)
    with BuildSketch(Plane(origin=(0, 26.35, 0), x_dir=(1, 0, 0), z_dir=(0, 1, 0))):
        Polygon((11.963760646, -16.350420978), (11.963760646, -22.528007323), (30.022930958, -23.761888284), (27.696884363, 28.84716935), (12.46748245, 20.875), (12.46748245, 15.649579022), (12.894365171, -16.350420978), align=None)
        Polygon((-12.751066043, -16.350420978), (-12.751066043, -23.761888284), (-21.517724294, -22.528007323), (-21.901635858, 22.206155736), (-13.252517552, 20.875), (-13.252517552, -16.350420978), align=None)
    extrude(amount=-CUT_EXTRUDE3_DEPTH, mode=Mode.SUBTRACT)


with BuildPart() as cut_extrude4_tool:
    # Sketch9 → Cut-Extrude4 (new, through all)
    with BuildSketch(Plane(origin=(-2e-09, 35.998516482, 0), x_dir=(1.0, 6.10309035182258e-11, 0), z_dir=(-6.10309035182258e-11, 1.0, -1.0368003232160358e-14))):
        Polygon((-12.751066041, -19.525420978), (13.891993445, -19.525420978), (13.555046053, -22.524424576), (-19.185008861, -22.524424576), align=None)
        Polygon((-13.25251755, 18.824579022), (15.127467216, 18.824579022), (13.105782864, 23.749676422), (-20.139693138, 23.131939537), align=None)
    extrude(amount=-CUT_EXTRUDE4_DEPTH)


with BuildPart() as part_1:
    add(part.part)

    # Cut-Extrude4: cut by cut_extrude4_tool, with a tolerance
    cut_extrude4_stock = TopTools_ListOfShape()
    cut_extrude4_stock.Append(part_1.part.wrapped)
    cut_extrude4_tools = TopTools_ListOfShape()
    cut_extrude4_tools.Append(cut_extrude4_tool.part.wrapped)
    cut_extrude4_cut = BRepAlgoAPI_Cut()
    cut_extrude4_cut.SetArguments(cut_extrude4_stock)
    cut_extrude4_cut.SetTools(cut_extrude4_tools)
    cut_extrude4_cut.SetFuzzyValue(0.00001)
    cut_extrude4_cut.Build()
    add(Compound.cast(cut_extrude4_cut.Shape()).solids(), mode=Mode.REPLACE)

    # Fillet2
    fillet2_edges = [part_1.edges().sort_by_distance(p)[0] for p in [
        (12.46748245, 19.58675824, -18.824579022),
        (-13.252517551, 19.58675824, -18.824579022),
        (-12.751066042, 19.58675824, 19.525420978),
        (11.963760646, 19.586758241, 19.525420978),
    ]]
    fillet(fillet2_edges, radius=FILLET2_R)


solid = part_1.part
